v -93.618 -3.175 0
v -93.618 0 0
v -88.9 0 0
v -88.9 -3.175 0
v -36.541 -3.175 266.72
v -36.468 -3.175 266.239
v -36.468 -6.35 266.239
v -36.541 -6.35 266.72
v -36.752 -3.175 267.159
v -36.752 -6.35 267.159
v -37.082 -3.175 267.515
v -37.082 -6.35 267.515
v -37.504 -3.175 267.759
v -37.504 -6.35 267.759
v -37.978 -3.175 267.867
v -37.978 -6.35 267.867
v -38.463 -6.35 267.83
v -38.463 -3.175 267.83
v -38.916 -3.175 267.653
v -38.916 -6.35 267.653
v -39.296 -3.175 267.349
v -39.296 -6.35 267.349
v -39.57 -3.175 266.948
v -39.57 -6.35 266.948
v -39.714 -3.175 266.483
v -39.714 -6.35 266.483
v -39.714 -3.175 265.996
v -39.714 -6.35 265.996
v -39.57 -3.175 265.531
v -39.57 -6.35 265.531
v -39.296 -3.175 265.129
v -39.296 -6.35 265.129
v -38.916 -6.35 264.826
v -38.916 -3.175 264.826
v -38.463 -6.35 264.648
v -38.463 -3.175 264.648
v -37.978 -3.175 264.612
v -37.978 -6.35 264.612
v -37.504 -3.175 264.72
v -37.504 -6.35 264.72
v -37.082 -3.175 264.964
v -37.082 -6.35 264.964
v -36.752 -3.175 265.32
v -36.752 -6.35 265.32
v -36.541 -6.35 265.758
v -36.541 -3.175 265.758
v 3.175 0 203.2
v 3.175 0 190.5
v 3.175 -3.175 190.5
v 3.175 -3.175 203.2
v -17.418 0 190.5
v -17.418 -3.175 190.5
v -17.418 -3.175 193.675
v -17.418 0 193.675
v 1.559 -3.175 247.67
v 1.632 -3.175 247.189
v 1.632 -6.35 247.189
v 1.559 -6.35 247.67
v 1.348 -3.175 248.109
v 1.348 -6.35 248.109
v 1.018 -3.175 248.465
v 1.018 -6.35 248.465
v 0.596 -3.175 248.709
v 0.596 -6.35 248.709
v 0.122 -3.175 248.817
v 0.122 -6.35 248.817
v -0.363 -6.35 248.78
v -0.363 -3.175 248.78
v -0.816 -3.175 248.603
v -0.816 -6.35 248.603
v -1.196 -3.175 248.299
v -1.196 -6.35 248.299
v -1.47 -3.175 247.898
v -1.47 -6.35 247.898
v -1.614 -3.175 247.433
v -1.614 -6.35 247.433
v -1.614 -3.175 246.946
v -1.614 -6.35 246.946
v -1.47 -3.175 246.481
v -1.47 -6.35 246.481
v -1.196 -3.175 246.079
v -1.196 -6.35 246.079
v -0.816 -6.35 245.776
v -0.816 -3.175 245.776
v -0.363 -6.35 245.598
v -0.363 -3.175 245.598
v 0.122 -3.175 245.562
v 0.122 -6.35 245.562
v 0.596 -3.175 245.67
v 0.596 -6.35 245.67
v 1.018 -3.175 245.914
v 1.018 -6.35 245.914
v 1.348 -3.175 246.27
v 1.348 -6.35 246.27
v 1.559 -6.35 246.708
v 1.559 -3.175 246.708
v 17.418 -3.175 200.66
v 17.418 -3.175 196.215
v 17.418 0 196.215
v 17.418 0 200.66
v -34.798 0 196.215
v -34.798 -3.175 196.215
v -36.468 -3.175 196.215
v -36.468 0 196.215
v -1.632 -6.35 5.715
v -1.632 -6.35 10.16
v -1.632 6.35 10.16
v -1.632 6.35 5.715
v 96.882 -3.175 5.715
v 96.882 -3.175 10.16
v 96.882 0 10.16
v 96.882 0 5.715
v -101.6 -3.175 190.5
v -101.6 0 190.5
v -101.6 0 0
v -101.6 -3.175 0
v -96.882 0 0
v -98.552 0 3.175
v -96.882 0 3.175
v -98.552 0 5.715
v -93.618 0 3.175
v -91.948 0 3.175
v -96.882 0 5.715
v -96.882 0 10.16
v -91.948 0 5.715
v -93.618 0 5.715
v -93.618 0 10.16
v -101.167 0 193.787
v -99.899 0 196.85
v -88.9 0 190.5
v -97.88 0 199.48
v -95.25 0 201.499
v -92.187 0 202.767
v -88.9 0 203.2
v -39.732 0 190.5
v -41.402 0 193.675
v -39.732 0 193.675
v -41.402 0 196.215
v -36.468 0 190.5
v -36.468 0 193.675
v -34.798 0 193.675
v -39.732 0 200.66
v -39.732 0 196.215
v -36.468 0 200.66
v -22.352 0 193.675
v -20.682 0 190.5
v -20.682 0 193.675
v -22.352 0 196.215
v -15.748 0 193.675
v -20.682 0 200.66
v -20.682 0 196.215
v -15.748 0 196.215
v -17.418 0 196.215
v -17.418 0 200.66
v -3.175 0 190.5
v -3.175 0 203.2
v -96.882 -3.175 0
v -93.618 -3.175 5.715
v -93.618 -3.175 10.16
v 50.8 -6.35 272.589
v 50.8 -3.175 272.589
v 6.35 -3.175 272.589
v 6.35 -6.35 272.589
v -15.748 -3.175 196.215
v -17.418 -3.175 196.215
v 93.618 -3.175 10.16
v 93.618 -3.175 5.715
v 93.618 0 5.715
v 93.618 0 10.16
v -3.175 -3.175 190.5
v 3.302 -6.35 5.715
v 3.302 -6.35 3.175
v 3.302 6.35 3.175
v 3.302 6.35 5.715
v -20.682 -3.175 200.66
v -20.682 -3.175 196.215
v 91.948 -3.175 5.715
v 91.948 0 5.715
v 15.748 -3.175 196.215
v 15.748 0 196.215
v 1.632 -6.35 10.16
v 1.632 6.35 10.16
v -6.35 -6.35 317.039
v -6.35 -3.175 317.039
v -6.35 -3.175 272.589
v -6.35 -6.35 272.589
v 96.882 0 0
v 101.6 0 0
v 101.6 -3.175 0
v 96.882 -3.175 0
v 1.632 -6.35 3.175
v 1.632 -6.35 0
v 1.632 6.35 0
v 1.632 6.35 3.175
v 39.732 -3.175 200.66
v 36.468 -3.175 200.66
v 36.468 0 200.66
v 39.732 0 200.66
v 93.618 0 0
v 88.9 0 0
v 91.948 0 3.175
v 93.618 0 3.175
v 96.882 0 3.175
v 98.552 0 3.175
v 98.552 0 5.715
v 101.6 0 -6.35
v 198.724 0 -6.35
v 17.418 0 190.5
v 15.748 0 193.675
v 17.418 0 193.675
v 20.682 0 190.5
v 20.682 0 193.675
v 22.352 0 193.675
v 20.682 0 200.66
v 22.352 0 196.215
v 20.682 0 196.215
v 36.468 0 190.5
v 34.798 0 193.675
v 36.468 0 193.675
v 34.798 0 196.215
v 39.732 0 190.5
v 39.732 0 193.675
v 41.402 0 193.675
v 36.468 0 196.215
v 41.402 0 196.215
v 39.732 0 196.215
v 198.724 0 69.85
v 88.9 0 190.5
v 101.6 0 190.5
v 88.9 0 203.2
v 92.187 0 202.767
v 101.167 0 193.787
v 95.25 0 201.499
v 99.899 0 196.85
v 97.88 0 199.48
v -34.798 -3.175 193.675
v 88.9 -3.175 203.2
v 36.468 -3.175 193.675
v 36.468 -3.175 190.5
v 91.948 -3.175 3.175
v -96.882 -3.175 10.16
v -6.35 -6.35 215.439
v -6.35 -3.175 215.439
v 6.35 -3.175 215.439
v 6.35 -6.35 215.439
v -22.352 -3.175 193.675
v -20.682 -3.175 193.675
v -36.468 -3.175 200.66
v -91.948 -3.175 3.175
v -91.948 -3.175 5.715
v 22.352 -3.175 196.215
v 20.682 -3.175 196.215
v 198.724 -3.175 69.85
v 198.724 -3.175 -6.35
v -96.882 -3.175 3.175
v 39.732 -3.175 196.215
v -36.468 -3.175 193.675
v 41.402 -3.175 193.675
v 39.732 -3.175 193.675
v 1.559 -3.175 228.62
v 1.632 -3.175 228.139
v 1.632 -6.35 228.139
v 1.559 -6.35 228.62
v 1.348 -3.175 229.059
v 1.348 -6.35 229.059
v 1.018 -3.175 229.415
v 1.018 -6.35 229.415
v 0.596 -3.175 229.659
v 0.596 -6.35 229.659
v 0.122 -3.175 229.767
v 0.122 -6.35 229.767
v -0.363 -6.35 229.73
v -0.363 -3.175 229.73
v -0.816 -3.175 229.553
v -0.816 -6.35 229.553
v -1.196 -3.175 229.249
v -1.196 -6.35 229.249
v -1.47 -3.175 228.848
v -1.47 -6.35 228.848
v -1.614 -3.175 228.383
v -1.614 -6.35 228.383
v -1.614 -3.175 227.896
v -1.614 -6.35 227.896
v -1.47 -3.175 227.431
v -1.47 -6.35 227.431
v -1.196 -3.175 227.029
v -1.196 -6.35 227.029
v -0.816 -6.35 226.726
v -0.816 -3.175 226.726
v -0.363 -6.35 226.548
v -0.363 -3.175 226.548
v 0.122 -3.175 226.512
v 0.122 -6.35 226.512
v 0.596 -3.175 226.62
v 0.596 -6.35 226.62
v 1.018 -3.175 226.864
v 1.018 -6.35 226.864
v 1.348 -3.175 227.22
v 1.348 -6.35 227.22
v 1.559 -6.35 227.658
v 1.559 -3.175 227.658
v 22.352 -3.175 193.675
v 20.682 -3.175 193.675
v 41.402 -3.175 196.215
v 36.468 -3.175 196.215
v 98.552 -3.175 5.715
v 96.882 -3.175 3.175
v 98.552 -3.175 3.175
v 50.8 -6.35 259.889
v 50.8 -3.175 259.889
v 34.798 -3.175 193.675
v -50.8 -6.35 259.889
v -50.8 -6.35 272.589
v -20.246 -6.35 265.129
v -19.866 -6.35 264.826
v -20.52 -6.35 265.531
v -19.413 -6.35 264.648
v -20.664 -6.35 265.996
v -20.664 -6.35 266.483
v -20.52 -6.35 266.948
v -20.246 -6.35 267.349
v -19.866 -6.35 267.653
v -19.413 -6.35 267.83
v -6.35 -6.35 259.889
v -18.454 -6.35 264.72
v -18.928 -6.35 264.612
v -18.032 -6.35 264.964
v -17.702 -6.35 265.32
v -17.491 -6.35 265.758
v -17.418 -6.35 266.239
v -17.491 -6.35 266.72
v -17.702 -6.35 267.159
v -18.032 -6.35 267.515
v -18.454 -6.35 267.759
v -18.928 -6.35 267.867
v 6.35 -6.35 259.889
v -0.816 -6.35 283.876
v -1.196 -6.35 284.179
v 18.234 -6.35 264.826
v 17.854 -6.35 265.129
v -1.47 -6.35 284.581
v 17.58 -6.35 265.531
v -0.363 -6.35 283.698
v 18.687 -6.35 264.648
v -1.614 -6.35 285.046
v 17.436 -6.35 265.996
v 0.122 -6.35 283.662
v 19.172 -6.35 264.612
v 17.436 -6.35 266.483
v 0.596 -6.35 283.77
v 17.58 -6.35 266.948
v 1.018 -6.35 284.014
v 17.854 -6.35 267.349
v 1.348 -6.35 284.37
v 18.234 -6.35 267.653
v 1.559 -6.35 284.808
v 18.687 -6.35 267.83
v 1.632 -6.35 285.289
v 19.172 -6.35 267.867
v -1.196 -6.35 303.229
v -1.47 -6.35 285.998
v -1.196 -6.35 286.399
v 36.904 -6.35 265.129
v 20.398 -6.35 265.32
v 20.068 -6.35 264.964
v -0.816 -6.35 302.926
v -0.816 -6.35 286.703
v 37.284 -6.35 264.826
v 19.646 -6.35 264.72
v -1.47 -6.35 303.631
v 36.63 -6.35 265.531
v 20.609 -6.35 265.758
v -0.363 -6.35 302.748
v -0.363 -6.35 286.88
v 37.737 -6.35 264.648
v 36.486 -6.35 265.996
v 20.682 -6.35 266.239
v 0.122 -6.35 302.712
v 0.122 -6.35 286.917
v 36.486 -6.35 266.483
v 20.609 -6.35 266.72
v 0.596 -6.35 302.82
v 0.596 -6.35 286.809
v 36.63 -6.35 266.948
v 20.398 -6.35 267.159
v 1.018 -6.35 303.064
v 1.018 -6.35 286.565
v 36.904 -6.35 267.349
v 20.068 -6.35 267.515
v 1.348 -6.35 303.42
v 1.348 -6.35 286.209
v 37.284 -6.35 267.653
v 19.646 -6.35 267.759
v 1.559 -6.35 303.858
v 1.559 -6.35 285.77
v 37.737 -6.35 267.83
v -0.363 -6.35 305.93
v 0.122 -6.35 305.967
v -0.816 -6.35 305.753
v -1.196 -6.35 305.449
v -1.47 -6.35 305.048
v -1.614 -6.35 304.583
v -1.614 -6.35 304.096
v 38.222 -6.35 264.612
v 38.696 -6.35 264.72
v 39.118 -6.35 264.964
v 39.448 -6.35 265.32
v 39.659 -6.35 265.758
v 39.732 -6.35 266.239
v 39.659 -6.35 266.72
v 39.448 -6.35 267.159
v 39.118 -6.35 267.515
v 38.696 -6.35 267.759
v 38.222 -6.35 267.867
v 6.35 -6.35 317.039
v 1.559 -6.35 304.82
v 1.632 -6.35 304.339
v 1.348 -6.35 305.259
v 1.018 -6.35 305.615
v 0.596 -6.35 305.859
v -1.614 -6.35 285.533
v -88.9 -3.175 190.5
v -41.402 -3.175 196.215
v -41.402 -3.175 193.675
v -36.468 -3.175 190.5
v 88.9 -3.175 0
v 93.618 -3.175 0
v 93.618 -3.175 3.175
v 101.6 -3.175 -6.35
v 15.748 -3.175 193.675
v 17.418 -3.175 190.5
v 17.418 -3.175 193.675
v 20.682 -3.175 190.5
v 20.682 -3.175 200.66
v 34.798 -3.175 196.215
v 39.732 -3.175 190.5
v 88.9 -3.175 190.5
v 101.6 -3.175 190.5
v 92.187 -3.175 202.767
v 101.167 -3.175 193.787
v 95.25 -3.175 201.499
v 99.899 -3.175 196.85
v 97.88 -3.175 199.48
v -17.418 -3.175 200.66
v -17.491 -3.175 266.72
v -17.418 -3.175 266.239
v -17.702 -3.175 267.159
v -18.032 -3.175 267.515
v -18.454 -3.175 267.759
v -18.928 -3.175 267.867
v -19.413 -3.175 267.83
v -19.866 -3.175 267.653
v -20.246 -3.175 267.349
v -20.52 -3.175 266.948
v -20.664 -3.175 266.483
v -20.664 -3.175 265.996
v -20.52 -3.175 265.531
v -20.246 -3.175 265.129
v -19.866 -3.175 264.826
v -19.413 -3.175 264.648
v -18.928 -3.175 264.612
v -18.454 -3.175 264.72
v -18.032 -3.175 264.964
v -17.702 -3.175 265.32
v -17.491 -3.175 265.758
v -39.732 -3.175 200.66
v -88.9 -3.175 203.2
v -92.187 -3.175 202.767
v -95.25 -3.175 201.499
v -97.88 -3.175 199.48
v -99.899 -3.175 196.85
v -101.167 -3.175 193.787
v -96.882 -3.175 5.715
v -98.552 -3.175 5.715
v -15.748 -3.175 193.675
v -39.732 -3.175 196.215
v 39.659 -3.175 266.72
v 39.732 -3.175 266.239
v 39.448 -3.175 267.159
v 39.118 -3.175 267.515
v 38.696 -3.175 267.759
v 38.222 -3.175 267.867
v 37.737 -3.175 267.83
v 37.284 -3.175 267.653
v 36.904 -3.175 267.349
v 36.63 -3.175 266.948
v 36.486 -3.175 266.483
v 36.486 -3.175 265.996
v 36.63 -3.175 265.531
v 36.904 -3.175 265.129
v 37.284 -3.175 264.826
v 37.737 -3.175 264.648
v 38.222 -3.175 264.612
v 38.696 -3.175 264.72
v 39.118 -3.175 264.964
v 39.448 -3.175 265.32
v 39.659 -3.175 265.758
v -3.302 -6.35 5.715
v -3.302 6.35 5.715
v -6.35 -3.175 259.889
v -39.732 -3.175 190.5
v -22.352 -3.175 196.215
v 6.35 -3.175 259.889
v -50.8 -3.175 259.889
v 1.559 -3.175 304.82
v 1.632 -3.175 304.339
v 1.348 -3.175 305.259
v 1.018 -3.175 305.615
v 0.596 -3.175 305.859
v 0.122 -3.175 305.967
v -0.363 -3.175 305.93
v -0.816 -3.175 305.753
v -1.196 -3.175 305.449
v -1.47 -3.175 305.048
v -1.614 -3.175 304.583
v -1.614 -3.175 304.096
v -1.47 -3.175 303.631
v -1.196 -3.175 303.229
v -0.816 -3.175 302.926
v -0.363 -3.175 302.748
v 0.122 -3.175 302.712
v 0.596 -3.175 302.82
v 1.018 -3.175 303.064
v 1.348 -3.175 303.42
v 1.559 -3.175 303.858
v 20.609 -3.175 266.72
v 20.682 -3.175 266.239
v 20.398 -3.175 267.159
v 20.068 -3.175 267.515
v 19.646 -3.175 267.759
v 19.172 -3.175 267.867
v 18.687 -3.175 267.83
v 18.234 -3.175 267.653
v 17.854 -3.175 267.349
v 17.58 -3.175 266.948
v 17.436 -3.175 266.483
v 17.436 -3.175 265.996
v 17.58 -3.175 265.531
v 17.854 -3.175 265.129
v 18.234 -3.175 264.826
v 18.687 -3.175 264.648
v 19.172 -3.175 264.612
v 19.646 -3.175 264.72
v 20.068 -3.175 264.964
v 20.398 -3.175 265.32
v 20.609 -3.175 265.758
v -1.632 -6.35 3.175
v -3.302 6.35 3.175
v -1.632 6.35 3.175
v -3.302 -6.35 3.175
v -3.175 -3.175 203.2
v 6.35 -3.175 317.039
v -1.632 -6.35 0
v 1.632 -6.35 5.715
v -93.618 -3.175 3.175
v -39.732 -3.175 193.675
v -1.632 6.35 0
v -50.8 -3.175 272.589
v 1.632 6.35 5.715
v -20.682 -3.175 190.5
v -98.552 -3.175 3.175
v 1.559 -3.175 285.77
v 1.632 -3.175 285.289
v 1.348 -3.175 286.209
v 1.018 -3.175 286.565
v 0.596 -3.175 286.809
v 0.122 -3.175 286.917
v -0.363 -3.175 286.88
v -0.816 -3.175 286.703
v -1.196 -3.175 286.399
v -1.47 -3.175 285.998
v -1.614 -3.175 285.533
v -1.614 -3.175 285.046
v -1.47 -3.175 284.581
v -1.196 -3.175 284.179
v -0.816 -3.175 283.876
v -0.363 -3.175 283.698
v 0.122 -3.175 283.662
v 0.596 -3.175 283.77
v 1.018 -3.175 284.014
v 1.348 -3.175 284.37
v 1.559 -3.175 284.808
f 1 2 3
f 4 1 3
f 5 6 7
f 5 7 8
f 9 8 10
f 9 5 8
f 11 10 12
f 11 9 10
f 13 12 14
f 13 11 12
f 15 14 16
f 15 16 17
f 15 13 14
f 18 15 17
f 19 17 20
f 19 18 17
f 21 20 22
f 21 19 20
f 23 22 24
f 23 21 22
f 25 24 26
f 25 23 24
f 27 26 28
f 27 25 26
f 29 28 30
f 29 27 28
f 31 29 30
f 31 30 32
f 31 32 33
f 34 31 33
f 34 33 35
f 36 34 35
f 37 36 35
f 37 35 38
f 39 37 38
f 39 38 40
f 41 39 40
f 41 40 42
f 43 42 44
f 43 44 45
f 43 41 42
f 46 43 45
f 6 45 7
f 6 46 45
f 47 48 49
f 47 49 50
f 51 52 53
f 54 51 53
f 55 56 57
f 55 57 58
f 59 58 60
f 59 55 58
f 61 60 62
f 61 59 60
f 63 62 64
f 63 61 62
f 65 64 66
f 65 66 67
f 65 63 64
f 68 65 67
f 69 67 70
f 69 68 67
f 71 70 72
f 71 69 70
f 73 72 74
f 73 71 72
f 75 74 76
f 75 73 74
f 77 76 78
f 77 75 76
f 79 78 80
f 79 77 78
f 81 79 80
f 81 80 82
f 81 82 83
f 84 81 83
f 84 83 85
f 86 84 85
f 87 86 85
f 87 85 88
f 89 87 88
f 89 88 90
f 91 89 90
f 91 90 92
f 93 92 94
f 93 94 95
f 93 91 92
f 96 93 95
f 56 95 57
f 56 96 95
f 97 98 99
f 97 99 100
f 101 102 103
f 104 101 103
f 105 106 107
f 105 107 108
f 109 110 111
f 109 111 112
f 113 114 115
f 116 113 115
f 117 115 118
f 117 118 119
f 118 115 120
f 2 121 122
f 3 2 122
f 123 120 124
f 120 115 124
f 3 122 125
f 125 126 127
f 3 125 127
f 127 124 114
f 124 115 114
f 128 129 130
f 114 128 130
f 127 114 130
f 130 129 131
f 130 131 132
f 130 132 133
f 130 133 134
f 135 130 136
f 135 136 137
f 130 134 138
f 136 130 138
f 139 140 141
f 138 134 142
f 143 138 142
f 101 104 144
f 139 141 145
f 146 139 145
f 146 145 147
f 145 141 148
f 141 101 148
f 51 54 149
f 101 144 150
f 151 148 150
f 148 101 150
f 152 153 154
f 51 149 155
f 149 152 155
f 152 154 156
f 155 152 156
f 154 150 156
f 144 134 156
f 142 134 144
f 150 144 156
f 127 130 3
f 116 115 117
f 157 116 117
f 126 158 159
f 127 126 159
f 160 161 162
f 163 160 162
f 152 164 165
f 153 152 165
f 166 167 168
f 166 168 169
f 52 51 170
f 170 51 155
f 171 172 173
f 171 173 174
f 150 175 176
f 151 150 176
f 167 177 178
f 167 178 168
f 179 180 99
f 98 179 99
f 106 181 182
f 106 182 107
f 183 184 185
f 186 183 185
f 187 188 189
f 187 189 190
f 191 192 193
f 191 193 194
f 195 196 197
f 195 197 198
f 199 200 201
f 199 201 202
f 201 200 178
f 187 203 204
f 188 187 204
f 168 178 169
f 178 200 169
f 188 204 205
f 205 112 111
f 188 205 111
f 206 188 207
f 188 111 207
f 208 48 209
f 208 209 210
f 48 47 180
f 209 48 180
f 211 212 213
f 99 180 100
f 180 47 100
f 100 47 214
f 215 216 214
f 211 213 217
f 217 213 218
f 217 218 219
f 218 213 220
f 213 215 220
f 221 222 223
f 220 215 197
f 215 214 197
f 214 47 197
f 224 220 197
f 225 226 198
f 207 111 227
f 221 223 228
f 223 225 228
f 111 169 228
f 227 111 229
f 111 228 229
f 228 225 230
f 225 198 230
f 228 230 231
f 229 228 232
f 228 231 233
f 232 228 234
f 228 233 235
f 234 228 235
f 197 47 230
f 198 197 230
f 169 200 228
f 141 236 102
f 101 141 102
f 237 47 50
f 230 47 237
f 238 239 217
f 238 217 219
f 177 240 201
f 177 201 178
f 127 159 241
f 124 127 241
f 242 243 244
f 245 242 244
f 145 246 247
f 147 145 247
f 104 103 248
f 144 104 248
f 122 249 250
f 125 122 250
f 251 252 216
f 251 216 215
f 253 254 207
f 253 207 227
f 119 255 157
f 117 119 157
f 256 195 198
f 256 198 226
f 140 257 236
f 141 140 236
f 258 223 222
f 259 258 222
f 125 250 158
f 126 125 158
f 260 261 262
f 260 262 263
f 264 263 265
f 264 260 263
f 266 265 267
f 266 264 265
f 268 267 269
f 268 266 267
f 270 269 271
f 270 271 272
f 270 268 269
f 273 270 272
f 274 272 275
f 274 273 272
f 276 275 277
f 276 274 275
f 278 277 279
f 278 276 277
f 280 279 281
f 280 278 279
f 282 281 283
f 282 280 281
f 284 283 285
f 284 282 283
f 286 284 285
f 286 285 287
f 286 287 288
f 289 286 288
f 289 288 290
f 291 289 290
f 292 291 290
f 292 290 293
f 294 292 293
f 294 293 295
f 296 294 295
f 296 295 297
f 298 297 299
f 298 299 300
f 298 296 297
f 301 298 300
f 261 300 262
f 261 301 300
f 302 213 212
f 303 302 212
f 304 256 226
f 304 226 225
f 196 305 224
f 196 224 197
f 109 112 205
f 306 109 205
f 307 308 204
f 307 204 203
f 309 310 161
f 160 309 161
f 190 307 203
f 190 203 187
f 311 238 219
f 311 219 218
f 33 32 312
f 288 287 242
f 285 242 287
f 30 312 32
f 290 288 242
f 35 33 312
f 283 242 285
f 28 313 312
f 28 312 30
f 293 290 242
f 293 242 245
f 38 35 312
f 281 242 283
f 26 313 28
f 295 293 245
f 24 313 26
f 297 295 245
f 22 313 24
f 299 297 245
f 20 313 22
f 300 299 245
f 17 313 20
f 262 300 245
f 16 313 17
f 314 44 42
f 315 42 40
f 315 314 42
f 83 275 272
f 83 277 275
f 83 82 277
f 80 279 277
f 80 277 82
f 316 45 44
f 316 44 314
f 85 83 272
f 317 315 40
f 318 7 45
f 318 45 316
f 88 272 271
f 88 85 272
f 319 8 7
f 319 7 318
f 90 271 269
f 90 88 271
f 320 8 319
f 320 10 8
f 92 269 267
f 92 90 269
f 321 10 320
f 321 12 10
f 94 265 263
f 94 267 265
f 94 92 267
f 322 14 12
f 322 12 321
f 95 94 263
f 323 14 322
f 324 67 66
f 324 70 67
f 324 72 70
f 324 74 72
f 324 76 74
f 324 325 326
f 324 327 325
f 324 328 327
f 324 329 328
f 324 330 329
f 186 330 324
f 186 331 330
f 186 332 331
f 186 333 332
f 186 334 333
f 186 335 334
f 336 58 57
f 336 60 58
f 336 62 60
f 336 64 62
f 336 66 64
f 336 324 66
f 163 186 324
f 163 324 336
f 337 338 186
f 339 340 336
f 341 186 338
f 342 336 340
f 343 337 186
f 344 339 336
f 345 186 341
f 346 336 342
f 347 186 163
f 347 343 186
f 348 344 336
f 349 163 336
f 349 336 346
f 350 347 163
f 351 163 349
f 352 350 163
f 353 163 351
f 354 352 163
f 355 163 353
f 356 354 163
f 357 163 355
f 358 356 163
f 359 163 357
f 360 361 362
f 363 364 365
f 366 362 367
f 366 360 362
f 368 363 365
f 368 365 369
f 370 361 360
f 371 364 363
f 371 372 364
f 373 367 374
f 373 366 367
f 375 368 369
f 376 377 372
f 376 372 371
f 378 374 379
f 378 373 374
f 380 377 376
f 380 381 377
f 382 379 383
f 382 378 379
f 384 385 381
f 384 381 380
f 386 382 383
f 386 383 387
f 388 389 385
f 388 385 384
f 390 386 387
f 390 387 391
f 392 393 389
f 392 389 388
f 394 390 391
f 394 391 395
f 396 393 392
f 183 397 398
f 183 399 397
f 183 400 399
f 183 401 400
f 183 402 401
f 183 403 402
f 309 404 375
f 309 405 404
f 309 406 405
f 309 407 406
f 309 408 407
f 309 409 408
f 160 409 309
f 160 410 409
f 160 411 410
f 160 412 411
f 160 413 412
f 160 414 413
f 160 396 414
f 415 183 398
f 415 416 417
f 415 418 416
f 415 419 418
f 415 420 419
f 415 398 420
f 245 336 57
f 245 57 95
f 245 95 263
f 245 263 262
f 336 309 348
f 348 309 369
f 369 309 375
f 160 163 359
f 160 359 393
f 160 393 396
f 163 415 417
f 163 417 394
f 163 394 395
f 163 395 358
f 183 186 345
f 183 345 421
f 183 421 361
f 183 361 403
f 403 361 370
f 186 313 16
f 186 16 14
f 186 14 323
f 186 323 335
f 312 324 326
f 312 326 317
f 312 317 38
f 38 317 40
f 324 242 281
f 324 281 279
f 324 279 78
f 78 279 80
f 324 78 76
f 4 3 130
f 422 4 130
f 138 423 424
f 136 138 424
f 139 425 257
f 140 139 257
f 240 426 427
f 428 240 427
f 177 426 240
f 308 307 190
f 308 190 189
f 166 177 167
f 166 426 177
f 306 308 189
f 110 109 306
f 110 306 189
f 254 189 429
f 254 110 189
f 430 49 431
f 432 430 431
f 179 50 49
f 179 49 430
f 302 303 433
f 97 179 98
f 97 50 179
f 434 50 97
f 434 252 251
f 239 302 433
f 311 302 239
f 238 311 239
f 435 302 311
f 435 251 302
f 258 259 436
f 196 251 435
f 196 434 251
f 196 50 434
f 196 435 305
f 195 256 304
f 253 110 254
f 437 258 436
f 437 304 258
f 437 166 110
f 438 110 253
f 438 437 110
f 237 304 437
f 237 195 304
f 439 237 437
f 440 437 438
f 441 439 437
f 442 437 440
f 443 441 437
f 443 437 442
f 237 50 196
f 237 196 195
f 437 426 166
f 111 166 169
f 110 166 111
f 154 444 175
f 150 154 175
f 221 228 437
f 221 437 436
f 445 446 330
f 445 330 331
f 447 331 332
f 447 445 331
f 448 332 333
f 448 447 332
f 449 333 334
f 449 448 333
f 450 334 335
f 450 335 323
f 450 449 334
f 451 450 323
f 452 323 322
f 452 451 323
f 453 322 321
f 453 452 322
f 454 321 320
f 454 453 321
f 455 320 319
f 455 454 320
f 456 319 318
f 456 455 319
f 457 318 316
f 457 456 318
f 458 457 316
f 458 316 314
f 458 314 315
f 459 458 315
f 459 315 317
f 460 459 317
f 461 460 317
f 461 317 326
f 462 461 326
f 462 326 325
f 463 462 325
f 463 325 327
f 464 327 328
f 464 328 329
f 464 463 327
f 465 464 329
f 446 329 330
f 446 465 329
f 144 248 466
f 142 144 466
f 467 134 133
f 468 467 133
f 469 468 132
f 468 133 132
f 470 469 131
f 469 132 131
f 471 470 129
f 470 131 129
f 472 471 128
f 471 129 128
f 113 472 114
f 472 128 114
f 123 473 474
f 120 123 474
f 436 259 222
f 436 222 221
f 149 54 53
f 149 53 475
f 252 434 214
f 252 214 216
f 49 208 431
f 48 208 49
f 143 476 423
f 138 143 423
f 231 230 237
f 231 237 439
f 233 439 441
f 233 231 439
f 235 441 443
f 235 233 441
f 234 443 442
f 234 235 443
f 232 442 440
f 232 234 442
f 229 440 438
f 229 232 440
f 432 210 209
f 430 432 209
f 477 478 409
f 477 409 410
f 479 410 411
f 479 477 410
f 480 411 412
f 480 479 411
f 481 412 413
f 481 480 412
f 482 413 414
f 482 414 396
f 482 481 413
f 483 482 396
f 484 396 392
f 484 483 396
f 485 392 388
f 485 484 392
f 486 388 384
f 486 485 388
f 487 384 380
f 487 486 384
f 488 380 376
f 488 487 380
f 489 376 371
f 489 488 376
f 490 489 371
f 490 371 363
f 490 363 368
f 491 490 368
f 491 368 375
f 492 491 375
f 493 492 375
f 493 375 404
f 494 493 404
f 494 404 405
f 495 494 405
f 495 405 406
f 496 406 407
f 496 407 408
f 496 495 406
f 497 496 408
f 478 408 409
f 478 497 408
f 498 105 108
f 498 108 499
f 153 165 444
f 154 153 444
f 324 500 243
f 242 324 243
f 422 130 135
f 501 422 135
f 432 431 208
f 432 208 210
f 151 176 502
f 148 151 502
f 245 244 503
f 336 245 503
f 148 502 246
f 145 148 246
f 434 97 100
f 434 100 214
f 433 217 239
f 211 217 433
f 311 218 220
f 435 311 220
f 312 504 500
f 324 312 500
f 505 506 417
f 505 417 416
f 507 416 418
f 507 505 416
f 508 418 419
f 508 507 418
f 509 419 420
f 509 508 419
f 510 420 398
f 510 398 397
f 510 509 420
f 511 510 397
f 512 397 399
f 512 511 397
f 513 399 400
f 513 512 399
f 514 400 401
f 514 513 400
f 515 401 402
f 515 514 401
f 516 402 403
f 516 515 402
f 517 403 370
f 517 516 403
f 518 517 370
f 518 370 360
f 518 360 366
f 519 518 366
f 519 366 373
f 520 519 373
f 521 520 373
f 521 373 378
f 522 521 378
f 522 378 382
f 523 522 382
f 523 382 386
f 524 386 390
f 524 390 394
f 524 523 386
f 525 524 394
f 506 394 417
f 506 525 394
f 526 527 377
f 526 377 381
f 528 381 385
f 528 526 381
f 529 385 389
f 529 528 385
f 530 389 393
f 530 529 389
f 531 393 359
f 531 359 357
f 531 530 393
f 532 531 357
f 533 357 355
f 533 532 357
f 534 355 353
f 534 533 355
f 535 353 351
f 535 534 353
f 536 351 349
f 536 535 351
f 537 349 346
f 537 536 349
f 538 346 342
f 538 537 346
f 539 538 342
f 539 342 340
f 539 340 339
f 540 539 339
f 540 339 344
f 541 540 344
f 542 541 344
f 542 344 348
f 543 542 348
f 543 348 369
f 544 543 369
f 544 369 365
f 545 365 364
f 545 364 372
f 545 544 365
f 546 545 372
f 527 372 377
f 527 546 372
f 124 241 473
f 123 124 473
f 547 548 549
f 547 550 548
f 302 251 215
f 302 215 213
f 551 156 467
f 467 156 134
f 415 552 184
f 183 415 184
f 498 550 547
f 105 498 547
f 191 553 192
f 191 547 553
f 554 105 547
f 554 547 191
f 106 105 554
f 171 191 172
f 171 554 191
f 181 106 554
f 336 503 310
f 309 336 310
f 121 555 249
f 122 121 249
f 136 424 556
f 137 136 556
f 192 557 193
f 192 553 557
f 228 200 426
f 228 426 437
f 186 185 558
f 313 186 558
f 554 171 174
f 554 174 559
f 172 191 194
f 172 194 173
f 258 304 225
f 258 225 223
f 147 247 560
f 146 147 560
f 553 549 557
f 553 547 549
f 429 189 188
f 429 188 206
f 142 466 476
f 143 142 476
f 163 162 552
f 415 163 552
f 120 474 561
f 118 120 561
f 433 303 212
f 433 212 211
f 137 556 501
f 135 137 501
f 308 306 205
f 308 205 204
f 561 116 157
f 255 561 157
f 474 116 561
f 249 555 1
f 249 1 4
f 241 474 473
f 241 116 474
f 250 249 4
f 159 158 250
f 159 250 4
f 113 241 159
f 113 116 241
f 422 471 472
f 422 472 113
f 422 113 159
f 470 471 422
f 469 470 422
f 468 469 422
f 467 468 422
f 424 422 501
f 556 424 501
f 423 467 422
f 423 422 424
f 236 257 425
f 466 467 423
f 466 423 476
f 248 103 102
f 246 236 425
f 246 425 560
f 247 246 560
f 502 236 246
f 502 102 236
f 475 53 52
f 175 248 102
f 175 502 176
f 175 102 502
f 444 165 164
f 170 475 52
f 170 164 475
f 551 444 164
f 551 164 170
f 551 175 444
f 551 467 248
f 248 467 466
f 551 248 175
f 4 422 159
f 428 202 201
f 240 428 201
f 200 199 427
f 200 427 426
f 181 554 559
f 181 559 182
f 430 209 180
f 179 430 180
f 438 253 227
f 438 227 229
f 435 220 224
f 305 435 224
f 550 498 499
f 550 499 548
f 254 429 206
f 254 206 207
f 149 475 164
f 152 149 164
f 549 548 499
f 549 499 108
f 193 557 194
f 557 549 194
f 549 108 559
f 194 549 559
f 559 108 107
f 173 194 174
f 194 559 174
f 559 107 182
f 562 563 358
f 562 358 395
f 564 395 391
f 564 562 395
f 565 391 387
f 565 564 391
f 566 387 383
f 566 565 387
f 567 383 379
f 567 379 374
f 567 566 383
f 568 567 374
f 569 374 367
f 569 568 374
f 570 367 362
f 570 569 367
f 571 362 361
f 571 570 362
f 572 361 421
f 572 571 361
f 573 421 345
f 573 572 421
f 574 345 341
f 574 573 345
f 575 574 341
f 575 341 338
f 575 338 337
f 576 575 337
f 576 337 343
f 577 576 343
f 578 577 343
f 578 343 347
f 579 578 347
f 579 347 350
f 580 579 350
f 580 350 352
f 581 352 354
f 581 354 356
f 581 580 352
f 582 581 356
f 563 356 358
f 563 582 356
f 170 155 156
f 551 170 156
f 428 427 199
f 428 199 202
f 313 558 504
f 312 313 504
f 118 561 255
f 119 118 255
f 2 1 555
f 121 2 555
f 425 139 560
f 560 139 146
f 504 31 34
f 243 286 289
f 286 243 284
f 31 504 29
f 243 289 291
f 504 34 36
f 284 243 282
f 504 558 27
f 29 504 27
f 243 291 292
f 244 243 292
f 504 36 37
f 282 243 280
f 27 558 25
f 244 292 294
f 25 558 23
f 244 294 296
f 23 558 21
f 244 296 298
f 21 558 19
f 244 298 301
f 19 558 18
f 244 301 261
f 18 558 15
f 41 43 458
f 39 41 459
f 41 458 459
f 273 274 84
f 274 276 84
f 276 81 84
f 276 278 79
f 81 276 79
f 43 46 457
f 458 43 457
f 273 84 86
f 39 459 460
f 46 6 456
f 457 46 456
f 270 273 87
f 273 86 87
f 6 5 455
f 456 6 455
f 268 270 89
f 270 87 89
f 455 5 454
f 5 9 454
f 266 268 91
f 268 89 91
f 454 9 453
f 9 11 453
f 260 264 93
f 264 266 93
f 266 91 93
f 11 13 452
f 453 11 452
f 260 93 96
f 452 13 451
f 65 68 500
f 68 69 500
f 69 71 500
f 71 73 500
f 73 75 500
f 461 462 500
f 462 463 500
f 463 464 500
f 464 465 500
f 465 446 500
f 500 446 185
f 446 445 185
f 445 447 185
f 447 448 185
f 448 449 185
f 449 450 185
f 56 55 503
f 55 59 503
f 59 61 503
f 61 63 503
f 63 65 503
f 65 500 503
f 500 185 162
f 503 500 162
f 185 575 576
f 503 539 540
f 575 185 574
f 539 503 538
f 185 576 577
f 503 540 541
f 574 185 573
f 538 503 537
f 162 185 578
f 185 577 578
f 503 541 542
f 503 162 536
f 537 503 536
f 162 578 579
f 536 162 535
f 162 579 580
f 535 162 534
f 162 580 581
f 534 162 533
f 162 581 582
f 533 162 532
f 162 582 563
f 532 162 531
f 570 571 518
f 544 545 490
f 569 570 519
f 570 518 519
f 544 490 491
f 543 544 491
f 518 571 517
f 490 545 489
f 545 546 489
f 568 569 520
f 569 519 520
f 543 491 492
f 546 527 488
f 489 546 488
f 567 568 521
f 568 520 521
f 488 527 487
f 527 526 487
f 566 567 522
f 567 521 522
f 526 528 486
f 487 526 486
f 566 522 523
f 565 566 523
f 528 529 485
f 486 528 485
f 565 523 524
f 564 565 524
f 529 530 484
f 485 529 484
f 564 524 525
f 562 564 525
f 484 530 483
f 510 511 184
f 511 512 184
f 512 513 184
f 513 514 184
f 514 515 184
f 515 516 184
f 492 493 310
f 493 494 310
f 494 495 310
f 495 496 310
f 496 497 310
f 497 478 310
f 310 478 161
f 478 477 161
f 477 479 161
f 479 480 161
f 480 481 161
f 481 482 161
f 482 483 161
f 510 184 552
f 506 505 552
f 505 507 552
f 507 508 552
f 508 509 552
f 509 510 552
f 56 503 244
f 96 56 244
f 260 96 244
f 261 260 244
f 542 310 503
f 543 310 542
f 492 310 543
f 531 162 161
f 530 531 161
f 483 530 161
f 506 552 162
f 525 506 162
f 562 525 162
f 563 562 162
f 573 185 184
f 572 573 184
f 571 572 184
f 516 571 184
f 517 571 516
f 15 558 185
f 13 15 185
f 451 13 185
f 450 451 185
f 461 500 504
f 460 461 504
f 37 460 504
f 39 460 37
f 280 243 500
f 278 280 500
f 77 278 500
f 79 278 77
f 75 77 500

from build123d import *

# Parameters (mm, degrees)
F3_DEPTH  = 6.35
F4_DEPTH  = 3.175
F13_DEPTH = 3.175
F14_R     = 1.63195
F15_DEPTH = 3.175


with BuildPart() as f3:
    # F2 (on Front) → F3 (new body, symmetric)
    with BuildSketch(Plane.XZ):
        Polygon((-1.63195, 0), (0, 0), (1.63195, 0), (1.63195, 3.175), (3.302, 3.175), (3.302, 5.715), (1.63195, 5.715), (1.63195, 10.16), (0, 10.16), (-1.63195, 10.16), (-1.63195, 5.715), (-3.302, 5.715), (-3.302, 3.175), (-1.63195, 3.175), align=None)
    extrude(amount=F3_DEPTH, both=True)


with BuildPart() as f4:
    # F1 (on Front) → F4 (new body)
    with BuildSketch(Plane.XZ):
        with BuildLine():
            ThreePointArc((-88.9, 203.2), (-97.880256, 199.480256), (-101.6, 190.5))
            Line((-101.6, 190.5), (-101.6, 0))
            Line((-101.6, 0), (-88.9, 0))
            Line((-88.9, 0), (-88.9, 177.8))
            Line((-88.9, 177.8), (-88.9, 190.5))
            Line((-88.9, 190.5), (-76.2, 190.5))
            Line((-76.2, 190.5), (-3.175, 190.5))
            Line((-3.175, 190.5), (-3.175, 203.2))
            Line((-3.175, 203.2), (-88.9, 203.2))
        make_face()
    extrude(amount=F4_DEPTH)


with BuildPart() as f5_1:
    # F5: copy of F3
    add(f3.part.moved(Location((-95.25, 0, 0))))


with BuildPart() as f4_1:
    add(f4.part)

    # F6: cut F5_1
    add(f5_1.part, mode=Mode.SUBTRACT)


with BuildPart() as f7_1:
    # F7: copy of F3
    add(f3.part.moved(Location((-19.05, 0, 190.5))))


with BuildPart() as f4_2:
    add(f4_1.part)

    # F8: cut F7_1
    add(f7_1.part, mode=Mode.SUBTRACT)


with BuildPart() as f9_1:
    # F9: copy of F3
    add(f3.part.moved(Location((-38.1, 0, 190.5))))


with BuildPart() as f4_3:
    add(f4_2.part)

    # F10: cut F9_1
    add(f9_1.part, mode=Mode.SUBTRACT)


with BuildPart() as f11_1:
    # F11: instance of F4
    add(f4_3.part.mirror(Plane.YZ))

    # F12 (on face) → F13 (join)
    with BuildSketch(Plane.XZ.offset(3.175)):
        Polygon((198.724285, 69.85), (101.6, 190.5), (101.6, 0), (101.6, -6.35), (198.724285, -6.35), (198.724285, 0), align=None)
    extrude(amount=-F13_DEPTH)


with BuildPart() as f15:
    # F14 (on face) → F15 (new body)
    with BuildSketch(Plane.XZ.offset(3.175)):
        Polygon((6.35, 259.889454), (0, 259.889454), (-6.35, 259.889454), (-6.35, 215.439454), (6.35, 215.439454), align=None)
        with Locations((0, 228.139454)):
            Circle(F14_R, mode=Mode.SUBTRACT)
        with Locations((0, 247.189454)):
            Circle(F14_R, mode=Mode.SUBTRACT)
        Polygon((-50.8, 259.889454), (-6.35, 259.889454), (-6.35, 266.239454), (-6.35, 272.589454), (-50.8, 272.589454), align=None)
        with Locations((-38.1, 266.239454)):
            Circle(F14_R, mode=Mode.SUBTRACT)
        with Locations((-19.05, 266.239454)):
            Circle(F14_R, mode=Mode.SUBTRACT)
        Polygon((-6.35, 259.889454), (0, 259.889454), (6.35, 259.889454), (6.35, 266.239454), (6.35, 272.589454), (0, 272.589454), (-6.35, 272.589454), (-6.35, 266.239454), align=None)
        Polygon((6.35, 266.239454), (6.35, 259.889454), (50.8, 259.889454), (50.8, 272.589454), (6.35, 272.589454), align=None)
        with Locations((19.05, 266.239454)):
            Circle(F14_R, mode=Mode.SUBTRACT)
        with Locations((38.1, 266.239454)):
            Circle(F14_R, mode=Mode.SUBTRACT)
        Polygon((-6.35, 317.039454), (-6.35, 272.589454), (0, 272.589454), (6.35, 272.589454), (6.35, 317.039454), align=None)
        with Locations((0, 285.289454)):
            Circle(F14_R, mode=Mode.SUBTRACT)
        with Locations((0, 304.339454)):
            Circle(F14_R, mode=Mode.SUBTRACT)
    extrude(amount=F15_DEPTH)


solid = Compound([f3.part, f4_3.part, f11_1.part, f15.part])
